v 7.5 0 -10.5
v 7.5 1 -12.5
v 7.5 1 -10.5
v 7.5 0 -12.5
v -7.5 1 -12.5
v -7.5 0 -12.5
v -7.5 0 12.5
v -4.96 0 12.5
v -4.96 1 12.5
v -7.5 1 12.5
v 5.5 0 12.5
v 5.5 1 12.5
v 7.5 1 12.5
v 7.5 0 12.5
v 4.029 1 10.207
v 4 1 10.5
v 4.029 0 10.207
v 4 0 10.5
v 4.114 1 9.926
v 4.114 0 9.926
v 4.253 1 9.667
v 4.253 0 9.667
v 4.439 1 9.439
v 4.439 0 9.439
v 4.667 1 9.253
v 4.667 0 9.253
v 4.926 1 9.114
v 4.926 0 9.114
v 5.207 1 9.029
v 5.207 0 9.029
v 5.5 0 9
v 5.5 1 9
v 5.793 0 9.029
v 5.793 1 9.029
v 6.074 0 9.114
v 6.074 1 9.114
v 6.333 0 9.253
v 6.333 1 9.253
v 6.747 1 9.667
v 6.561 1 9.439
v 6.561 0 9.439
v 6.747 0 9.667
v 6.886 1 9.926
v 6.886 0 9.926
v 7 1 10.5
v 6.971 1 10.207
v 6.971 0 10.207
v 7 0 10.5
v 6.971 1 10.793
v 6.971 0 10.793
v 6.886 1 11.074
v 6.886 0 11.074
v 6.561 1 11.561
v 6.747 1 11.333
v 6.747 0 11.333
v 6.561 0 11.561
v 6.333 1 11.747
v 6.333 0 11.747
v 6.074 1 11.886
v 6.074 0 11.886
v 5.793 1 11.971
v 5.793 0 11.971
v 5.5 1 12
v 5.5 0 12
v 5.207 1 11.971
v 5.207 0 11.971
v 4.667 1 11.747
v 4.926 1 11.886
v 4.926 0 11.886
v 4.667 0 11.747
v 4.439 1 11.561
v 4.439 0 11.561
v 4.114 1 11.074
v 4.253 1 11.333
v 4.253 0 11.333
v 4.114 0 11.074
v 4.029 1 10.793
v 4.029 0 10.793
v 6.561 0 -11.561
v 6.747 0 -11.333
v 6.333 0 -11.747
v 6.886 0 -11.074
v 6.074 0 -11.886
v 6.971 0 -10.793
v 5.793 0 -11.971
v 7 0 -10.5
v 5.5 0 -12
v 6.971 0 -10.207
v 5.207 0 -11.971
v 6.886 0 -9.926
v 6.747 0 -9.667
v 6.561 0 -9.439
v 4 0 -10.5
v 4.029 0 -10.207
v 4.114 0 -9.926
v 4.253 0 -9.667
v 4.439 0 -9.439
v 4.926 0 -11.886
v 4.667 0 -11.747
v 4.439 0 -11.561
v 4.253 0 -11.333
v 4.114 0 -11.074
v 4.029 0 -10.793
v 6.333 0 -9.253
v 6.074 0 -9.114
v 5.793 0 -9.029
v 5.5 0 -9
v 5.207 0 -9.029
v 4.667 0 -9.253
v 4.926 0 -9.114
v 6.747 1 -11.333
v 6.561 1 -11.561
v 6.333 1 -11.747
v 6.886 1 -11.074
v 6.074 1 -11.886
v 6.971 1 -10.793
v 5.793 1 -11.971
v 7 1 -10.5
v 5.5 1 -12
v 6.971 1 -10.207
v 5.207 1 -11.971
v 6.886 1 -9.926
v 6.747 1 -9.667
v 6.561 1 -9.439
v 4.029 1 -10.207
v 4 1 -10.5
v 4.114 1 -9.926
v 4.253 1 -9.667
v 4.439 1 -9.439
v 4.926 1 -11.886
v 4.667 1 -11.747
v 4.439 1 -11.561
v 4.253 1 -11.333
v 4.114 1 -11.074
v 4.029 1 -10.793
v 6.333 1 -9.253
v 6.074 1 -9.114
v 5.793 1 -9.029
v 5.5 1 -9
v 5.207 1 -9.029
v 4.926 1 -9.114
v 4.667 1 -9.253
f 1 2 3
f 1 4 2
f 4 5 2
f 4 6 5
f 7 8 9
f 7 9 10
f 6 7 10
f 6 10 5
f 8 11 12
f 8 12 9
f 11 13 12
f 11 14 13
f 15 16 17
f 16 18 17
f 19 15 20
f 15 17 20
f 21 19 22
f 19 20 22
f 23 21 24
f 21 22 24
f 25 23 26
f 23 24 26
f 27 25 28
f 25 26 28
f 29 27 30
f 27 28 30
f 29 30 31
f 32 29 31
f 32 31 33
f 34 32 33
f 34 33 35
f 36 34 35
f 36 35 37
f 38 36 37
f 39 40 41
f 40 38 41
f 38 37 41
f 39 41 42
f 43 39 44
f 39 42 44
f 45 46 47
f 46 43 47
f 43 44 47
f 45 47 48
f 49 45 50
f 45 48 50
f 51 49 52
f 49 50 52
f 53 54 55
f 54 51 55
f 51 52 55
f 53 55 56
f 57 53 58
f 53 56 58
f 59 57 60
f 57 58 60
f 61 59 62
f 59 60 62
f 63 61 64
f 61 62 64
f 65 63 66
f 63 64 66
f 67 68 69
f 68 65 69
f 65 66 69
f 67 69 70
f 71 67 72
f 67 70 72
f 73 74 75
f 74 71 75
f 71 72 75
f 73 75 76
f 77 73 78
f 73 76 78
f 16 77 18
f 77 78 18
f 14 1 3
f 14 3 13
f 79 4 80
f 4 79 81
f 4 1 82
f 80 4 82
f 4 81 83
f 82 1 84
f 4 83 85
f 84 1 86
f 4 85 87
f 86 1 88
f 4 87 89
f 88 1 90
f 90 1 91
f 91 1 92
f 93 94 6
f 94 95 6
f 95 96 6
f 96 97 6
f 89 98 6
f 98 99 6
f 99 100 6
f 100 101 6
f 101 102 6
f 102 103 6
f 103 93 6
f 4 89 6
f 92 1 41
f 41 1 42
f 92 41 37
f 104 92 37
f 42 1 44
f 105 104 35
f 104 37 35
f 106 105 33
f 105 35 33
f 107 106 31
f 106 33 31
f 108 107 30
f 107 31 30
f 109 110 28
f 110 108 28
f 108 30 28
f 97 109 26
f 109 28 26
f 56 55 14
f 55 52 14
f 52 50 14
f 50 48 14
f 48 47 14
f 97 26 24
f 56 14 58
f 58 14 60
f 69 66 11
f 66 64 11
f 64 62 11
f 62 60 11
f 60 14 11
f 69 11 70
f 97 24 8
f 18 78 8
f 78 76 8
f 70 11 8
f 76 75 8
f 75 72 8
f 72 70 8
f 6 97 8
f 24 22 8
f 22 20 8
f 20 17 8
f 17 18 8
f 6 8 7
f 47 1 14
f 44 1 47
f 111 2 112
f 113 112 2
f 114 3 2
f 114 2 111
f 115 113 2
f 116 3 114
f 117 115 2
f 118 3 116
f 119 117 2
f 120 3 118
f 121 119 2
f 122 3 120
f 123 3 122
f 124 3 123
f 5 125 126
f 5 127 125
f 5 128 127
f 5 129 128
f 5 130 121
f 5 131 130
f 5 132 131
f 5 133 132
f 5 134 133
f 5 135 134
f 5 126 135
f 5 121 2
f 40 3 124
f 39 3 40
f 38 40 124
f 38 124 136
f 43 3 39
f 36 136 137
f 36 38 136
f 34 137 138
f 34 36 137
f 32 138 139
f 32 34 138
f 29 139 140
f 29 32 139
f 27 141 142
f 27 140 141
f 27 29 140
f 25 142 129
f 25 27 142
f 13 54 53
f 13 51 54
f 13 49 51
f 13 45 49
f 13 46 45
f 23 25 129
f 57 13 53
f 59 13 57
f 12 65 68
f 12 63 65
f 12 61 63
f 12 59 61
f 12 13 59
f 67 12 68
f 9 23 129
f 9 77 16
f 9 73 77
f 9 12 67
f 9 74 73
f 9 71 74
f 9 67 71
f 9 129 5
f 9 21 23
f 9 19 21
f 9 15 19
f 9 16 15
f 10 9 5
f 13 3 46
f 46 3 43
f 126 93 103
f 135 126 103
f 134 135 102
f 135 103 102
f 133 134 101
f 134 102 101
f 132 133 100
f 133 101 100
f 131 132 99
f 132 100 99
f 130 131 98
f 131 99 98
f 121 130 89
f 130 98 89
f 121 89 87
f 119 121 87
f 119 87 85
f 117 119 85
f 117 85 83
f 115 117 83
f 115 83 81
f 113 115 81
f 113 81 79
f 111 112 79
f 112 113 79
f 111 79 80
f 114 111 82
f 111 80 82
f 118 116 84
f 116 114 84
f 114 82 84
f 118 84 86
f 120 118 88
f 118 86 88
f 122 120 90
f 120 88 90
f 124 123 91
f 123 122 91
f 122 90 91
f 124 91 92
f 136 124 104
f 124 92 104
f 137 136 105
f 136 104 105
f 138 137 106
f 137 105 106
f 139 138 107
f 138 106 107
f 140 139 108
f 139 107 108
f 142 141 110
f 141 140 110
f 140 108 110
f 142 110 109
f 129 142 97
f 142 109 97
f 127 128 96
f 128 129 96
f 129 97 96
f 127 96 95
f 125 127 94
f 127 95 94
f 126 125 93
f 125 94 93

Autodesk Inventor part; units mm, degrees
ref_plane "YZ Plane" through (0, 0, 0) normal (1, 0, 0) x (0, 1, 0)
ref_plane "XZ Plane" through (0, 0, 0) normal (0, 1, 0) x (-1, 0, 0)
ref_plane "XY Plane" through (0, 0, 0) normal (0, 0, 1) x (1, 0, 0)
sketch "Sketch1" plane through (0, 0, 0) normal (0, 1, 0) x (-1, 0, 0)
  line L0 (-7.5, 12.5) -> (7.5, 12.5)
  line L1 (7.5, 12.5) -> (7.5, -12.5)
  line L2 (7.5, -12.5) -> (-7.5, -12.5)
  line L3 (-7.5, -12.5) -> (-7.5, 12.5)
  line L4 (-7.5, 12.5) -> (7.5, -12.5) construction
  line L5 (7.5, 12.5) -> (4.96, 12.5)
  line L6 (-7.5, 12.5) -> (-5.5, 12.5)
  circle A0 centre (-5.5, 10.5) radius 1.5
  line L7 (-7.5, -12.5) -> (-7.5, -10.5)
  circle A1 centre (-5.5, -10.5) radius 1.5
  point P0 (0, 0)
  dimension "d0" = 15
  dimension "d1" = 25
  dimension "d9" = 2
  dimension "d11" = 3
  dimension "d12" = 2
  dimension "d14" = 3
extrude "Extrusion1" add sketch "Sketch1" along normal blind 1
properties part number "Compass"
